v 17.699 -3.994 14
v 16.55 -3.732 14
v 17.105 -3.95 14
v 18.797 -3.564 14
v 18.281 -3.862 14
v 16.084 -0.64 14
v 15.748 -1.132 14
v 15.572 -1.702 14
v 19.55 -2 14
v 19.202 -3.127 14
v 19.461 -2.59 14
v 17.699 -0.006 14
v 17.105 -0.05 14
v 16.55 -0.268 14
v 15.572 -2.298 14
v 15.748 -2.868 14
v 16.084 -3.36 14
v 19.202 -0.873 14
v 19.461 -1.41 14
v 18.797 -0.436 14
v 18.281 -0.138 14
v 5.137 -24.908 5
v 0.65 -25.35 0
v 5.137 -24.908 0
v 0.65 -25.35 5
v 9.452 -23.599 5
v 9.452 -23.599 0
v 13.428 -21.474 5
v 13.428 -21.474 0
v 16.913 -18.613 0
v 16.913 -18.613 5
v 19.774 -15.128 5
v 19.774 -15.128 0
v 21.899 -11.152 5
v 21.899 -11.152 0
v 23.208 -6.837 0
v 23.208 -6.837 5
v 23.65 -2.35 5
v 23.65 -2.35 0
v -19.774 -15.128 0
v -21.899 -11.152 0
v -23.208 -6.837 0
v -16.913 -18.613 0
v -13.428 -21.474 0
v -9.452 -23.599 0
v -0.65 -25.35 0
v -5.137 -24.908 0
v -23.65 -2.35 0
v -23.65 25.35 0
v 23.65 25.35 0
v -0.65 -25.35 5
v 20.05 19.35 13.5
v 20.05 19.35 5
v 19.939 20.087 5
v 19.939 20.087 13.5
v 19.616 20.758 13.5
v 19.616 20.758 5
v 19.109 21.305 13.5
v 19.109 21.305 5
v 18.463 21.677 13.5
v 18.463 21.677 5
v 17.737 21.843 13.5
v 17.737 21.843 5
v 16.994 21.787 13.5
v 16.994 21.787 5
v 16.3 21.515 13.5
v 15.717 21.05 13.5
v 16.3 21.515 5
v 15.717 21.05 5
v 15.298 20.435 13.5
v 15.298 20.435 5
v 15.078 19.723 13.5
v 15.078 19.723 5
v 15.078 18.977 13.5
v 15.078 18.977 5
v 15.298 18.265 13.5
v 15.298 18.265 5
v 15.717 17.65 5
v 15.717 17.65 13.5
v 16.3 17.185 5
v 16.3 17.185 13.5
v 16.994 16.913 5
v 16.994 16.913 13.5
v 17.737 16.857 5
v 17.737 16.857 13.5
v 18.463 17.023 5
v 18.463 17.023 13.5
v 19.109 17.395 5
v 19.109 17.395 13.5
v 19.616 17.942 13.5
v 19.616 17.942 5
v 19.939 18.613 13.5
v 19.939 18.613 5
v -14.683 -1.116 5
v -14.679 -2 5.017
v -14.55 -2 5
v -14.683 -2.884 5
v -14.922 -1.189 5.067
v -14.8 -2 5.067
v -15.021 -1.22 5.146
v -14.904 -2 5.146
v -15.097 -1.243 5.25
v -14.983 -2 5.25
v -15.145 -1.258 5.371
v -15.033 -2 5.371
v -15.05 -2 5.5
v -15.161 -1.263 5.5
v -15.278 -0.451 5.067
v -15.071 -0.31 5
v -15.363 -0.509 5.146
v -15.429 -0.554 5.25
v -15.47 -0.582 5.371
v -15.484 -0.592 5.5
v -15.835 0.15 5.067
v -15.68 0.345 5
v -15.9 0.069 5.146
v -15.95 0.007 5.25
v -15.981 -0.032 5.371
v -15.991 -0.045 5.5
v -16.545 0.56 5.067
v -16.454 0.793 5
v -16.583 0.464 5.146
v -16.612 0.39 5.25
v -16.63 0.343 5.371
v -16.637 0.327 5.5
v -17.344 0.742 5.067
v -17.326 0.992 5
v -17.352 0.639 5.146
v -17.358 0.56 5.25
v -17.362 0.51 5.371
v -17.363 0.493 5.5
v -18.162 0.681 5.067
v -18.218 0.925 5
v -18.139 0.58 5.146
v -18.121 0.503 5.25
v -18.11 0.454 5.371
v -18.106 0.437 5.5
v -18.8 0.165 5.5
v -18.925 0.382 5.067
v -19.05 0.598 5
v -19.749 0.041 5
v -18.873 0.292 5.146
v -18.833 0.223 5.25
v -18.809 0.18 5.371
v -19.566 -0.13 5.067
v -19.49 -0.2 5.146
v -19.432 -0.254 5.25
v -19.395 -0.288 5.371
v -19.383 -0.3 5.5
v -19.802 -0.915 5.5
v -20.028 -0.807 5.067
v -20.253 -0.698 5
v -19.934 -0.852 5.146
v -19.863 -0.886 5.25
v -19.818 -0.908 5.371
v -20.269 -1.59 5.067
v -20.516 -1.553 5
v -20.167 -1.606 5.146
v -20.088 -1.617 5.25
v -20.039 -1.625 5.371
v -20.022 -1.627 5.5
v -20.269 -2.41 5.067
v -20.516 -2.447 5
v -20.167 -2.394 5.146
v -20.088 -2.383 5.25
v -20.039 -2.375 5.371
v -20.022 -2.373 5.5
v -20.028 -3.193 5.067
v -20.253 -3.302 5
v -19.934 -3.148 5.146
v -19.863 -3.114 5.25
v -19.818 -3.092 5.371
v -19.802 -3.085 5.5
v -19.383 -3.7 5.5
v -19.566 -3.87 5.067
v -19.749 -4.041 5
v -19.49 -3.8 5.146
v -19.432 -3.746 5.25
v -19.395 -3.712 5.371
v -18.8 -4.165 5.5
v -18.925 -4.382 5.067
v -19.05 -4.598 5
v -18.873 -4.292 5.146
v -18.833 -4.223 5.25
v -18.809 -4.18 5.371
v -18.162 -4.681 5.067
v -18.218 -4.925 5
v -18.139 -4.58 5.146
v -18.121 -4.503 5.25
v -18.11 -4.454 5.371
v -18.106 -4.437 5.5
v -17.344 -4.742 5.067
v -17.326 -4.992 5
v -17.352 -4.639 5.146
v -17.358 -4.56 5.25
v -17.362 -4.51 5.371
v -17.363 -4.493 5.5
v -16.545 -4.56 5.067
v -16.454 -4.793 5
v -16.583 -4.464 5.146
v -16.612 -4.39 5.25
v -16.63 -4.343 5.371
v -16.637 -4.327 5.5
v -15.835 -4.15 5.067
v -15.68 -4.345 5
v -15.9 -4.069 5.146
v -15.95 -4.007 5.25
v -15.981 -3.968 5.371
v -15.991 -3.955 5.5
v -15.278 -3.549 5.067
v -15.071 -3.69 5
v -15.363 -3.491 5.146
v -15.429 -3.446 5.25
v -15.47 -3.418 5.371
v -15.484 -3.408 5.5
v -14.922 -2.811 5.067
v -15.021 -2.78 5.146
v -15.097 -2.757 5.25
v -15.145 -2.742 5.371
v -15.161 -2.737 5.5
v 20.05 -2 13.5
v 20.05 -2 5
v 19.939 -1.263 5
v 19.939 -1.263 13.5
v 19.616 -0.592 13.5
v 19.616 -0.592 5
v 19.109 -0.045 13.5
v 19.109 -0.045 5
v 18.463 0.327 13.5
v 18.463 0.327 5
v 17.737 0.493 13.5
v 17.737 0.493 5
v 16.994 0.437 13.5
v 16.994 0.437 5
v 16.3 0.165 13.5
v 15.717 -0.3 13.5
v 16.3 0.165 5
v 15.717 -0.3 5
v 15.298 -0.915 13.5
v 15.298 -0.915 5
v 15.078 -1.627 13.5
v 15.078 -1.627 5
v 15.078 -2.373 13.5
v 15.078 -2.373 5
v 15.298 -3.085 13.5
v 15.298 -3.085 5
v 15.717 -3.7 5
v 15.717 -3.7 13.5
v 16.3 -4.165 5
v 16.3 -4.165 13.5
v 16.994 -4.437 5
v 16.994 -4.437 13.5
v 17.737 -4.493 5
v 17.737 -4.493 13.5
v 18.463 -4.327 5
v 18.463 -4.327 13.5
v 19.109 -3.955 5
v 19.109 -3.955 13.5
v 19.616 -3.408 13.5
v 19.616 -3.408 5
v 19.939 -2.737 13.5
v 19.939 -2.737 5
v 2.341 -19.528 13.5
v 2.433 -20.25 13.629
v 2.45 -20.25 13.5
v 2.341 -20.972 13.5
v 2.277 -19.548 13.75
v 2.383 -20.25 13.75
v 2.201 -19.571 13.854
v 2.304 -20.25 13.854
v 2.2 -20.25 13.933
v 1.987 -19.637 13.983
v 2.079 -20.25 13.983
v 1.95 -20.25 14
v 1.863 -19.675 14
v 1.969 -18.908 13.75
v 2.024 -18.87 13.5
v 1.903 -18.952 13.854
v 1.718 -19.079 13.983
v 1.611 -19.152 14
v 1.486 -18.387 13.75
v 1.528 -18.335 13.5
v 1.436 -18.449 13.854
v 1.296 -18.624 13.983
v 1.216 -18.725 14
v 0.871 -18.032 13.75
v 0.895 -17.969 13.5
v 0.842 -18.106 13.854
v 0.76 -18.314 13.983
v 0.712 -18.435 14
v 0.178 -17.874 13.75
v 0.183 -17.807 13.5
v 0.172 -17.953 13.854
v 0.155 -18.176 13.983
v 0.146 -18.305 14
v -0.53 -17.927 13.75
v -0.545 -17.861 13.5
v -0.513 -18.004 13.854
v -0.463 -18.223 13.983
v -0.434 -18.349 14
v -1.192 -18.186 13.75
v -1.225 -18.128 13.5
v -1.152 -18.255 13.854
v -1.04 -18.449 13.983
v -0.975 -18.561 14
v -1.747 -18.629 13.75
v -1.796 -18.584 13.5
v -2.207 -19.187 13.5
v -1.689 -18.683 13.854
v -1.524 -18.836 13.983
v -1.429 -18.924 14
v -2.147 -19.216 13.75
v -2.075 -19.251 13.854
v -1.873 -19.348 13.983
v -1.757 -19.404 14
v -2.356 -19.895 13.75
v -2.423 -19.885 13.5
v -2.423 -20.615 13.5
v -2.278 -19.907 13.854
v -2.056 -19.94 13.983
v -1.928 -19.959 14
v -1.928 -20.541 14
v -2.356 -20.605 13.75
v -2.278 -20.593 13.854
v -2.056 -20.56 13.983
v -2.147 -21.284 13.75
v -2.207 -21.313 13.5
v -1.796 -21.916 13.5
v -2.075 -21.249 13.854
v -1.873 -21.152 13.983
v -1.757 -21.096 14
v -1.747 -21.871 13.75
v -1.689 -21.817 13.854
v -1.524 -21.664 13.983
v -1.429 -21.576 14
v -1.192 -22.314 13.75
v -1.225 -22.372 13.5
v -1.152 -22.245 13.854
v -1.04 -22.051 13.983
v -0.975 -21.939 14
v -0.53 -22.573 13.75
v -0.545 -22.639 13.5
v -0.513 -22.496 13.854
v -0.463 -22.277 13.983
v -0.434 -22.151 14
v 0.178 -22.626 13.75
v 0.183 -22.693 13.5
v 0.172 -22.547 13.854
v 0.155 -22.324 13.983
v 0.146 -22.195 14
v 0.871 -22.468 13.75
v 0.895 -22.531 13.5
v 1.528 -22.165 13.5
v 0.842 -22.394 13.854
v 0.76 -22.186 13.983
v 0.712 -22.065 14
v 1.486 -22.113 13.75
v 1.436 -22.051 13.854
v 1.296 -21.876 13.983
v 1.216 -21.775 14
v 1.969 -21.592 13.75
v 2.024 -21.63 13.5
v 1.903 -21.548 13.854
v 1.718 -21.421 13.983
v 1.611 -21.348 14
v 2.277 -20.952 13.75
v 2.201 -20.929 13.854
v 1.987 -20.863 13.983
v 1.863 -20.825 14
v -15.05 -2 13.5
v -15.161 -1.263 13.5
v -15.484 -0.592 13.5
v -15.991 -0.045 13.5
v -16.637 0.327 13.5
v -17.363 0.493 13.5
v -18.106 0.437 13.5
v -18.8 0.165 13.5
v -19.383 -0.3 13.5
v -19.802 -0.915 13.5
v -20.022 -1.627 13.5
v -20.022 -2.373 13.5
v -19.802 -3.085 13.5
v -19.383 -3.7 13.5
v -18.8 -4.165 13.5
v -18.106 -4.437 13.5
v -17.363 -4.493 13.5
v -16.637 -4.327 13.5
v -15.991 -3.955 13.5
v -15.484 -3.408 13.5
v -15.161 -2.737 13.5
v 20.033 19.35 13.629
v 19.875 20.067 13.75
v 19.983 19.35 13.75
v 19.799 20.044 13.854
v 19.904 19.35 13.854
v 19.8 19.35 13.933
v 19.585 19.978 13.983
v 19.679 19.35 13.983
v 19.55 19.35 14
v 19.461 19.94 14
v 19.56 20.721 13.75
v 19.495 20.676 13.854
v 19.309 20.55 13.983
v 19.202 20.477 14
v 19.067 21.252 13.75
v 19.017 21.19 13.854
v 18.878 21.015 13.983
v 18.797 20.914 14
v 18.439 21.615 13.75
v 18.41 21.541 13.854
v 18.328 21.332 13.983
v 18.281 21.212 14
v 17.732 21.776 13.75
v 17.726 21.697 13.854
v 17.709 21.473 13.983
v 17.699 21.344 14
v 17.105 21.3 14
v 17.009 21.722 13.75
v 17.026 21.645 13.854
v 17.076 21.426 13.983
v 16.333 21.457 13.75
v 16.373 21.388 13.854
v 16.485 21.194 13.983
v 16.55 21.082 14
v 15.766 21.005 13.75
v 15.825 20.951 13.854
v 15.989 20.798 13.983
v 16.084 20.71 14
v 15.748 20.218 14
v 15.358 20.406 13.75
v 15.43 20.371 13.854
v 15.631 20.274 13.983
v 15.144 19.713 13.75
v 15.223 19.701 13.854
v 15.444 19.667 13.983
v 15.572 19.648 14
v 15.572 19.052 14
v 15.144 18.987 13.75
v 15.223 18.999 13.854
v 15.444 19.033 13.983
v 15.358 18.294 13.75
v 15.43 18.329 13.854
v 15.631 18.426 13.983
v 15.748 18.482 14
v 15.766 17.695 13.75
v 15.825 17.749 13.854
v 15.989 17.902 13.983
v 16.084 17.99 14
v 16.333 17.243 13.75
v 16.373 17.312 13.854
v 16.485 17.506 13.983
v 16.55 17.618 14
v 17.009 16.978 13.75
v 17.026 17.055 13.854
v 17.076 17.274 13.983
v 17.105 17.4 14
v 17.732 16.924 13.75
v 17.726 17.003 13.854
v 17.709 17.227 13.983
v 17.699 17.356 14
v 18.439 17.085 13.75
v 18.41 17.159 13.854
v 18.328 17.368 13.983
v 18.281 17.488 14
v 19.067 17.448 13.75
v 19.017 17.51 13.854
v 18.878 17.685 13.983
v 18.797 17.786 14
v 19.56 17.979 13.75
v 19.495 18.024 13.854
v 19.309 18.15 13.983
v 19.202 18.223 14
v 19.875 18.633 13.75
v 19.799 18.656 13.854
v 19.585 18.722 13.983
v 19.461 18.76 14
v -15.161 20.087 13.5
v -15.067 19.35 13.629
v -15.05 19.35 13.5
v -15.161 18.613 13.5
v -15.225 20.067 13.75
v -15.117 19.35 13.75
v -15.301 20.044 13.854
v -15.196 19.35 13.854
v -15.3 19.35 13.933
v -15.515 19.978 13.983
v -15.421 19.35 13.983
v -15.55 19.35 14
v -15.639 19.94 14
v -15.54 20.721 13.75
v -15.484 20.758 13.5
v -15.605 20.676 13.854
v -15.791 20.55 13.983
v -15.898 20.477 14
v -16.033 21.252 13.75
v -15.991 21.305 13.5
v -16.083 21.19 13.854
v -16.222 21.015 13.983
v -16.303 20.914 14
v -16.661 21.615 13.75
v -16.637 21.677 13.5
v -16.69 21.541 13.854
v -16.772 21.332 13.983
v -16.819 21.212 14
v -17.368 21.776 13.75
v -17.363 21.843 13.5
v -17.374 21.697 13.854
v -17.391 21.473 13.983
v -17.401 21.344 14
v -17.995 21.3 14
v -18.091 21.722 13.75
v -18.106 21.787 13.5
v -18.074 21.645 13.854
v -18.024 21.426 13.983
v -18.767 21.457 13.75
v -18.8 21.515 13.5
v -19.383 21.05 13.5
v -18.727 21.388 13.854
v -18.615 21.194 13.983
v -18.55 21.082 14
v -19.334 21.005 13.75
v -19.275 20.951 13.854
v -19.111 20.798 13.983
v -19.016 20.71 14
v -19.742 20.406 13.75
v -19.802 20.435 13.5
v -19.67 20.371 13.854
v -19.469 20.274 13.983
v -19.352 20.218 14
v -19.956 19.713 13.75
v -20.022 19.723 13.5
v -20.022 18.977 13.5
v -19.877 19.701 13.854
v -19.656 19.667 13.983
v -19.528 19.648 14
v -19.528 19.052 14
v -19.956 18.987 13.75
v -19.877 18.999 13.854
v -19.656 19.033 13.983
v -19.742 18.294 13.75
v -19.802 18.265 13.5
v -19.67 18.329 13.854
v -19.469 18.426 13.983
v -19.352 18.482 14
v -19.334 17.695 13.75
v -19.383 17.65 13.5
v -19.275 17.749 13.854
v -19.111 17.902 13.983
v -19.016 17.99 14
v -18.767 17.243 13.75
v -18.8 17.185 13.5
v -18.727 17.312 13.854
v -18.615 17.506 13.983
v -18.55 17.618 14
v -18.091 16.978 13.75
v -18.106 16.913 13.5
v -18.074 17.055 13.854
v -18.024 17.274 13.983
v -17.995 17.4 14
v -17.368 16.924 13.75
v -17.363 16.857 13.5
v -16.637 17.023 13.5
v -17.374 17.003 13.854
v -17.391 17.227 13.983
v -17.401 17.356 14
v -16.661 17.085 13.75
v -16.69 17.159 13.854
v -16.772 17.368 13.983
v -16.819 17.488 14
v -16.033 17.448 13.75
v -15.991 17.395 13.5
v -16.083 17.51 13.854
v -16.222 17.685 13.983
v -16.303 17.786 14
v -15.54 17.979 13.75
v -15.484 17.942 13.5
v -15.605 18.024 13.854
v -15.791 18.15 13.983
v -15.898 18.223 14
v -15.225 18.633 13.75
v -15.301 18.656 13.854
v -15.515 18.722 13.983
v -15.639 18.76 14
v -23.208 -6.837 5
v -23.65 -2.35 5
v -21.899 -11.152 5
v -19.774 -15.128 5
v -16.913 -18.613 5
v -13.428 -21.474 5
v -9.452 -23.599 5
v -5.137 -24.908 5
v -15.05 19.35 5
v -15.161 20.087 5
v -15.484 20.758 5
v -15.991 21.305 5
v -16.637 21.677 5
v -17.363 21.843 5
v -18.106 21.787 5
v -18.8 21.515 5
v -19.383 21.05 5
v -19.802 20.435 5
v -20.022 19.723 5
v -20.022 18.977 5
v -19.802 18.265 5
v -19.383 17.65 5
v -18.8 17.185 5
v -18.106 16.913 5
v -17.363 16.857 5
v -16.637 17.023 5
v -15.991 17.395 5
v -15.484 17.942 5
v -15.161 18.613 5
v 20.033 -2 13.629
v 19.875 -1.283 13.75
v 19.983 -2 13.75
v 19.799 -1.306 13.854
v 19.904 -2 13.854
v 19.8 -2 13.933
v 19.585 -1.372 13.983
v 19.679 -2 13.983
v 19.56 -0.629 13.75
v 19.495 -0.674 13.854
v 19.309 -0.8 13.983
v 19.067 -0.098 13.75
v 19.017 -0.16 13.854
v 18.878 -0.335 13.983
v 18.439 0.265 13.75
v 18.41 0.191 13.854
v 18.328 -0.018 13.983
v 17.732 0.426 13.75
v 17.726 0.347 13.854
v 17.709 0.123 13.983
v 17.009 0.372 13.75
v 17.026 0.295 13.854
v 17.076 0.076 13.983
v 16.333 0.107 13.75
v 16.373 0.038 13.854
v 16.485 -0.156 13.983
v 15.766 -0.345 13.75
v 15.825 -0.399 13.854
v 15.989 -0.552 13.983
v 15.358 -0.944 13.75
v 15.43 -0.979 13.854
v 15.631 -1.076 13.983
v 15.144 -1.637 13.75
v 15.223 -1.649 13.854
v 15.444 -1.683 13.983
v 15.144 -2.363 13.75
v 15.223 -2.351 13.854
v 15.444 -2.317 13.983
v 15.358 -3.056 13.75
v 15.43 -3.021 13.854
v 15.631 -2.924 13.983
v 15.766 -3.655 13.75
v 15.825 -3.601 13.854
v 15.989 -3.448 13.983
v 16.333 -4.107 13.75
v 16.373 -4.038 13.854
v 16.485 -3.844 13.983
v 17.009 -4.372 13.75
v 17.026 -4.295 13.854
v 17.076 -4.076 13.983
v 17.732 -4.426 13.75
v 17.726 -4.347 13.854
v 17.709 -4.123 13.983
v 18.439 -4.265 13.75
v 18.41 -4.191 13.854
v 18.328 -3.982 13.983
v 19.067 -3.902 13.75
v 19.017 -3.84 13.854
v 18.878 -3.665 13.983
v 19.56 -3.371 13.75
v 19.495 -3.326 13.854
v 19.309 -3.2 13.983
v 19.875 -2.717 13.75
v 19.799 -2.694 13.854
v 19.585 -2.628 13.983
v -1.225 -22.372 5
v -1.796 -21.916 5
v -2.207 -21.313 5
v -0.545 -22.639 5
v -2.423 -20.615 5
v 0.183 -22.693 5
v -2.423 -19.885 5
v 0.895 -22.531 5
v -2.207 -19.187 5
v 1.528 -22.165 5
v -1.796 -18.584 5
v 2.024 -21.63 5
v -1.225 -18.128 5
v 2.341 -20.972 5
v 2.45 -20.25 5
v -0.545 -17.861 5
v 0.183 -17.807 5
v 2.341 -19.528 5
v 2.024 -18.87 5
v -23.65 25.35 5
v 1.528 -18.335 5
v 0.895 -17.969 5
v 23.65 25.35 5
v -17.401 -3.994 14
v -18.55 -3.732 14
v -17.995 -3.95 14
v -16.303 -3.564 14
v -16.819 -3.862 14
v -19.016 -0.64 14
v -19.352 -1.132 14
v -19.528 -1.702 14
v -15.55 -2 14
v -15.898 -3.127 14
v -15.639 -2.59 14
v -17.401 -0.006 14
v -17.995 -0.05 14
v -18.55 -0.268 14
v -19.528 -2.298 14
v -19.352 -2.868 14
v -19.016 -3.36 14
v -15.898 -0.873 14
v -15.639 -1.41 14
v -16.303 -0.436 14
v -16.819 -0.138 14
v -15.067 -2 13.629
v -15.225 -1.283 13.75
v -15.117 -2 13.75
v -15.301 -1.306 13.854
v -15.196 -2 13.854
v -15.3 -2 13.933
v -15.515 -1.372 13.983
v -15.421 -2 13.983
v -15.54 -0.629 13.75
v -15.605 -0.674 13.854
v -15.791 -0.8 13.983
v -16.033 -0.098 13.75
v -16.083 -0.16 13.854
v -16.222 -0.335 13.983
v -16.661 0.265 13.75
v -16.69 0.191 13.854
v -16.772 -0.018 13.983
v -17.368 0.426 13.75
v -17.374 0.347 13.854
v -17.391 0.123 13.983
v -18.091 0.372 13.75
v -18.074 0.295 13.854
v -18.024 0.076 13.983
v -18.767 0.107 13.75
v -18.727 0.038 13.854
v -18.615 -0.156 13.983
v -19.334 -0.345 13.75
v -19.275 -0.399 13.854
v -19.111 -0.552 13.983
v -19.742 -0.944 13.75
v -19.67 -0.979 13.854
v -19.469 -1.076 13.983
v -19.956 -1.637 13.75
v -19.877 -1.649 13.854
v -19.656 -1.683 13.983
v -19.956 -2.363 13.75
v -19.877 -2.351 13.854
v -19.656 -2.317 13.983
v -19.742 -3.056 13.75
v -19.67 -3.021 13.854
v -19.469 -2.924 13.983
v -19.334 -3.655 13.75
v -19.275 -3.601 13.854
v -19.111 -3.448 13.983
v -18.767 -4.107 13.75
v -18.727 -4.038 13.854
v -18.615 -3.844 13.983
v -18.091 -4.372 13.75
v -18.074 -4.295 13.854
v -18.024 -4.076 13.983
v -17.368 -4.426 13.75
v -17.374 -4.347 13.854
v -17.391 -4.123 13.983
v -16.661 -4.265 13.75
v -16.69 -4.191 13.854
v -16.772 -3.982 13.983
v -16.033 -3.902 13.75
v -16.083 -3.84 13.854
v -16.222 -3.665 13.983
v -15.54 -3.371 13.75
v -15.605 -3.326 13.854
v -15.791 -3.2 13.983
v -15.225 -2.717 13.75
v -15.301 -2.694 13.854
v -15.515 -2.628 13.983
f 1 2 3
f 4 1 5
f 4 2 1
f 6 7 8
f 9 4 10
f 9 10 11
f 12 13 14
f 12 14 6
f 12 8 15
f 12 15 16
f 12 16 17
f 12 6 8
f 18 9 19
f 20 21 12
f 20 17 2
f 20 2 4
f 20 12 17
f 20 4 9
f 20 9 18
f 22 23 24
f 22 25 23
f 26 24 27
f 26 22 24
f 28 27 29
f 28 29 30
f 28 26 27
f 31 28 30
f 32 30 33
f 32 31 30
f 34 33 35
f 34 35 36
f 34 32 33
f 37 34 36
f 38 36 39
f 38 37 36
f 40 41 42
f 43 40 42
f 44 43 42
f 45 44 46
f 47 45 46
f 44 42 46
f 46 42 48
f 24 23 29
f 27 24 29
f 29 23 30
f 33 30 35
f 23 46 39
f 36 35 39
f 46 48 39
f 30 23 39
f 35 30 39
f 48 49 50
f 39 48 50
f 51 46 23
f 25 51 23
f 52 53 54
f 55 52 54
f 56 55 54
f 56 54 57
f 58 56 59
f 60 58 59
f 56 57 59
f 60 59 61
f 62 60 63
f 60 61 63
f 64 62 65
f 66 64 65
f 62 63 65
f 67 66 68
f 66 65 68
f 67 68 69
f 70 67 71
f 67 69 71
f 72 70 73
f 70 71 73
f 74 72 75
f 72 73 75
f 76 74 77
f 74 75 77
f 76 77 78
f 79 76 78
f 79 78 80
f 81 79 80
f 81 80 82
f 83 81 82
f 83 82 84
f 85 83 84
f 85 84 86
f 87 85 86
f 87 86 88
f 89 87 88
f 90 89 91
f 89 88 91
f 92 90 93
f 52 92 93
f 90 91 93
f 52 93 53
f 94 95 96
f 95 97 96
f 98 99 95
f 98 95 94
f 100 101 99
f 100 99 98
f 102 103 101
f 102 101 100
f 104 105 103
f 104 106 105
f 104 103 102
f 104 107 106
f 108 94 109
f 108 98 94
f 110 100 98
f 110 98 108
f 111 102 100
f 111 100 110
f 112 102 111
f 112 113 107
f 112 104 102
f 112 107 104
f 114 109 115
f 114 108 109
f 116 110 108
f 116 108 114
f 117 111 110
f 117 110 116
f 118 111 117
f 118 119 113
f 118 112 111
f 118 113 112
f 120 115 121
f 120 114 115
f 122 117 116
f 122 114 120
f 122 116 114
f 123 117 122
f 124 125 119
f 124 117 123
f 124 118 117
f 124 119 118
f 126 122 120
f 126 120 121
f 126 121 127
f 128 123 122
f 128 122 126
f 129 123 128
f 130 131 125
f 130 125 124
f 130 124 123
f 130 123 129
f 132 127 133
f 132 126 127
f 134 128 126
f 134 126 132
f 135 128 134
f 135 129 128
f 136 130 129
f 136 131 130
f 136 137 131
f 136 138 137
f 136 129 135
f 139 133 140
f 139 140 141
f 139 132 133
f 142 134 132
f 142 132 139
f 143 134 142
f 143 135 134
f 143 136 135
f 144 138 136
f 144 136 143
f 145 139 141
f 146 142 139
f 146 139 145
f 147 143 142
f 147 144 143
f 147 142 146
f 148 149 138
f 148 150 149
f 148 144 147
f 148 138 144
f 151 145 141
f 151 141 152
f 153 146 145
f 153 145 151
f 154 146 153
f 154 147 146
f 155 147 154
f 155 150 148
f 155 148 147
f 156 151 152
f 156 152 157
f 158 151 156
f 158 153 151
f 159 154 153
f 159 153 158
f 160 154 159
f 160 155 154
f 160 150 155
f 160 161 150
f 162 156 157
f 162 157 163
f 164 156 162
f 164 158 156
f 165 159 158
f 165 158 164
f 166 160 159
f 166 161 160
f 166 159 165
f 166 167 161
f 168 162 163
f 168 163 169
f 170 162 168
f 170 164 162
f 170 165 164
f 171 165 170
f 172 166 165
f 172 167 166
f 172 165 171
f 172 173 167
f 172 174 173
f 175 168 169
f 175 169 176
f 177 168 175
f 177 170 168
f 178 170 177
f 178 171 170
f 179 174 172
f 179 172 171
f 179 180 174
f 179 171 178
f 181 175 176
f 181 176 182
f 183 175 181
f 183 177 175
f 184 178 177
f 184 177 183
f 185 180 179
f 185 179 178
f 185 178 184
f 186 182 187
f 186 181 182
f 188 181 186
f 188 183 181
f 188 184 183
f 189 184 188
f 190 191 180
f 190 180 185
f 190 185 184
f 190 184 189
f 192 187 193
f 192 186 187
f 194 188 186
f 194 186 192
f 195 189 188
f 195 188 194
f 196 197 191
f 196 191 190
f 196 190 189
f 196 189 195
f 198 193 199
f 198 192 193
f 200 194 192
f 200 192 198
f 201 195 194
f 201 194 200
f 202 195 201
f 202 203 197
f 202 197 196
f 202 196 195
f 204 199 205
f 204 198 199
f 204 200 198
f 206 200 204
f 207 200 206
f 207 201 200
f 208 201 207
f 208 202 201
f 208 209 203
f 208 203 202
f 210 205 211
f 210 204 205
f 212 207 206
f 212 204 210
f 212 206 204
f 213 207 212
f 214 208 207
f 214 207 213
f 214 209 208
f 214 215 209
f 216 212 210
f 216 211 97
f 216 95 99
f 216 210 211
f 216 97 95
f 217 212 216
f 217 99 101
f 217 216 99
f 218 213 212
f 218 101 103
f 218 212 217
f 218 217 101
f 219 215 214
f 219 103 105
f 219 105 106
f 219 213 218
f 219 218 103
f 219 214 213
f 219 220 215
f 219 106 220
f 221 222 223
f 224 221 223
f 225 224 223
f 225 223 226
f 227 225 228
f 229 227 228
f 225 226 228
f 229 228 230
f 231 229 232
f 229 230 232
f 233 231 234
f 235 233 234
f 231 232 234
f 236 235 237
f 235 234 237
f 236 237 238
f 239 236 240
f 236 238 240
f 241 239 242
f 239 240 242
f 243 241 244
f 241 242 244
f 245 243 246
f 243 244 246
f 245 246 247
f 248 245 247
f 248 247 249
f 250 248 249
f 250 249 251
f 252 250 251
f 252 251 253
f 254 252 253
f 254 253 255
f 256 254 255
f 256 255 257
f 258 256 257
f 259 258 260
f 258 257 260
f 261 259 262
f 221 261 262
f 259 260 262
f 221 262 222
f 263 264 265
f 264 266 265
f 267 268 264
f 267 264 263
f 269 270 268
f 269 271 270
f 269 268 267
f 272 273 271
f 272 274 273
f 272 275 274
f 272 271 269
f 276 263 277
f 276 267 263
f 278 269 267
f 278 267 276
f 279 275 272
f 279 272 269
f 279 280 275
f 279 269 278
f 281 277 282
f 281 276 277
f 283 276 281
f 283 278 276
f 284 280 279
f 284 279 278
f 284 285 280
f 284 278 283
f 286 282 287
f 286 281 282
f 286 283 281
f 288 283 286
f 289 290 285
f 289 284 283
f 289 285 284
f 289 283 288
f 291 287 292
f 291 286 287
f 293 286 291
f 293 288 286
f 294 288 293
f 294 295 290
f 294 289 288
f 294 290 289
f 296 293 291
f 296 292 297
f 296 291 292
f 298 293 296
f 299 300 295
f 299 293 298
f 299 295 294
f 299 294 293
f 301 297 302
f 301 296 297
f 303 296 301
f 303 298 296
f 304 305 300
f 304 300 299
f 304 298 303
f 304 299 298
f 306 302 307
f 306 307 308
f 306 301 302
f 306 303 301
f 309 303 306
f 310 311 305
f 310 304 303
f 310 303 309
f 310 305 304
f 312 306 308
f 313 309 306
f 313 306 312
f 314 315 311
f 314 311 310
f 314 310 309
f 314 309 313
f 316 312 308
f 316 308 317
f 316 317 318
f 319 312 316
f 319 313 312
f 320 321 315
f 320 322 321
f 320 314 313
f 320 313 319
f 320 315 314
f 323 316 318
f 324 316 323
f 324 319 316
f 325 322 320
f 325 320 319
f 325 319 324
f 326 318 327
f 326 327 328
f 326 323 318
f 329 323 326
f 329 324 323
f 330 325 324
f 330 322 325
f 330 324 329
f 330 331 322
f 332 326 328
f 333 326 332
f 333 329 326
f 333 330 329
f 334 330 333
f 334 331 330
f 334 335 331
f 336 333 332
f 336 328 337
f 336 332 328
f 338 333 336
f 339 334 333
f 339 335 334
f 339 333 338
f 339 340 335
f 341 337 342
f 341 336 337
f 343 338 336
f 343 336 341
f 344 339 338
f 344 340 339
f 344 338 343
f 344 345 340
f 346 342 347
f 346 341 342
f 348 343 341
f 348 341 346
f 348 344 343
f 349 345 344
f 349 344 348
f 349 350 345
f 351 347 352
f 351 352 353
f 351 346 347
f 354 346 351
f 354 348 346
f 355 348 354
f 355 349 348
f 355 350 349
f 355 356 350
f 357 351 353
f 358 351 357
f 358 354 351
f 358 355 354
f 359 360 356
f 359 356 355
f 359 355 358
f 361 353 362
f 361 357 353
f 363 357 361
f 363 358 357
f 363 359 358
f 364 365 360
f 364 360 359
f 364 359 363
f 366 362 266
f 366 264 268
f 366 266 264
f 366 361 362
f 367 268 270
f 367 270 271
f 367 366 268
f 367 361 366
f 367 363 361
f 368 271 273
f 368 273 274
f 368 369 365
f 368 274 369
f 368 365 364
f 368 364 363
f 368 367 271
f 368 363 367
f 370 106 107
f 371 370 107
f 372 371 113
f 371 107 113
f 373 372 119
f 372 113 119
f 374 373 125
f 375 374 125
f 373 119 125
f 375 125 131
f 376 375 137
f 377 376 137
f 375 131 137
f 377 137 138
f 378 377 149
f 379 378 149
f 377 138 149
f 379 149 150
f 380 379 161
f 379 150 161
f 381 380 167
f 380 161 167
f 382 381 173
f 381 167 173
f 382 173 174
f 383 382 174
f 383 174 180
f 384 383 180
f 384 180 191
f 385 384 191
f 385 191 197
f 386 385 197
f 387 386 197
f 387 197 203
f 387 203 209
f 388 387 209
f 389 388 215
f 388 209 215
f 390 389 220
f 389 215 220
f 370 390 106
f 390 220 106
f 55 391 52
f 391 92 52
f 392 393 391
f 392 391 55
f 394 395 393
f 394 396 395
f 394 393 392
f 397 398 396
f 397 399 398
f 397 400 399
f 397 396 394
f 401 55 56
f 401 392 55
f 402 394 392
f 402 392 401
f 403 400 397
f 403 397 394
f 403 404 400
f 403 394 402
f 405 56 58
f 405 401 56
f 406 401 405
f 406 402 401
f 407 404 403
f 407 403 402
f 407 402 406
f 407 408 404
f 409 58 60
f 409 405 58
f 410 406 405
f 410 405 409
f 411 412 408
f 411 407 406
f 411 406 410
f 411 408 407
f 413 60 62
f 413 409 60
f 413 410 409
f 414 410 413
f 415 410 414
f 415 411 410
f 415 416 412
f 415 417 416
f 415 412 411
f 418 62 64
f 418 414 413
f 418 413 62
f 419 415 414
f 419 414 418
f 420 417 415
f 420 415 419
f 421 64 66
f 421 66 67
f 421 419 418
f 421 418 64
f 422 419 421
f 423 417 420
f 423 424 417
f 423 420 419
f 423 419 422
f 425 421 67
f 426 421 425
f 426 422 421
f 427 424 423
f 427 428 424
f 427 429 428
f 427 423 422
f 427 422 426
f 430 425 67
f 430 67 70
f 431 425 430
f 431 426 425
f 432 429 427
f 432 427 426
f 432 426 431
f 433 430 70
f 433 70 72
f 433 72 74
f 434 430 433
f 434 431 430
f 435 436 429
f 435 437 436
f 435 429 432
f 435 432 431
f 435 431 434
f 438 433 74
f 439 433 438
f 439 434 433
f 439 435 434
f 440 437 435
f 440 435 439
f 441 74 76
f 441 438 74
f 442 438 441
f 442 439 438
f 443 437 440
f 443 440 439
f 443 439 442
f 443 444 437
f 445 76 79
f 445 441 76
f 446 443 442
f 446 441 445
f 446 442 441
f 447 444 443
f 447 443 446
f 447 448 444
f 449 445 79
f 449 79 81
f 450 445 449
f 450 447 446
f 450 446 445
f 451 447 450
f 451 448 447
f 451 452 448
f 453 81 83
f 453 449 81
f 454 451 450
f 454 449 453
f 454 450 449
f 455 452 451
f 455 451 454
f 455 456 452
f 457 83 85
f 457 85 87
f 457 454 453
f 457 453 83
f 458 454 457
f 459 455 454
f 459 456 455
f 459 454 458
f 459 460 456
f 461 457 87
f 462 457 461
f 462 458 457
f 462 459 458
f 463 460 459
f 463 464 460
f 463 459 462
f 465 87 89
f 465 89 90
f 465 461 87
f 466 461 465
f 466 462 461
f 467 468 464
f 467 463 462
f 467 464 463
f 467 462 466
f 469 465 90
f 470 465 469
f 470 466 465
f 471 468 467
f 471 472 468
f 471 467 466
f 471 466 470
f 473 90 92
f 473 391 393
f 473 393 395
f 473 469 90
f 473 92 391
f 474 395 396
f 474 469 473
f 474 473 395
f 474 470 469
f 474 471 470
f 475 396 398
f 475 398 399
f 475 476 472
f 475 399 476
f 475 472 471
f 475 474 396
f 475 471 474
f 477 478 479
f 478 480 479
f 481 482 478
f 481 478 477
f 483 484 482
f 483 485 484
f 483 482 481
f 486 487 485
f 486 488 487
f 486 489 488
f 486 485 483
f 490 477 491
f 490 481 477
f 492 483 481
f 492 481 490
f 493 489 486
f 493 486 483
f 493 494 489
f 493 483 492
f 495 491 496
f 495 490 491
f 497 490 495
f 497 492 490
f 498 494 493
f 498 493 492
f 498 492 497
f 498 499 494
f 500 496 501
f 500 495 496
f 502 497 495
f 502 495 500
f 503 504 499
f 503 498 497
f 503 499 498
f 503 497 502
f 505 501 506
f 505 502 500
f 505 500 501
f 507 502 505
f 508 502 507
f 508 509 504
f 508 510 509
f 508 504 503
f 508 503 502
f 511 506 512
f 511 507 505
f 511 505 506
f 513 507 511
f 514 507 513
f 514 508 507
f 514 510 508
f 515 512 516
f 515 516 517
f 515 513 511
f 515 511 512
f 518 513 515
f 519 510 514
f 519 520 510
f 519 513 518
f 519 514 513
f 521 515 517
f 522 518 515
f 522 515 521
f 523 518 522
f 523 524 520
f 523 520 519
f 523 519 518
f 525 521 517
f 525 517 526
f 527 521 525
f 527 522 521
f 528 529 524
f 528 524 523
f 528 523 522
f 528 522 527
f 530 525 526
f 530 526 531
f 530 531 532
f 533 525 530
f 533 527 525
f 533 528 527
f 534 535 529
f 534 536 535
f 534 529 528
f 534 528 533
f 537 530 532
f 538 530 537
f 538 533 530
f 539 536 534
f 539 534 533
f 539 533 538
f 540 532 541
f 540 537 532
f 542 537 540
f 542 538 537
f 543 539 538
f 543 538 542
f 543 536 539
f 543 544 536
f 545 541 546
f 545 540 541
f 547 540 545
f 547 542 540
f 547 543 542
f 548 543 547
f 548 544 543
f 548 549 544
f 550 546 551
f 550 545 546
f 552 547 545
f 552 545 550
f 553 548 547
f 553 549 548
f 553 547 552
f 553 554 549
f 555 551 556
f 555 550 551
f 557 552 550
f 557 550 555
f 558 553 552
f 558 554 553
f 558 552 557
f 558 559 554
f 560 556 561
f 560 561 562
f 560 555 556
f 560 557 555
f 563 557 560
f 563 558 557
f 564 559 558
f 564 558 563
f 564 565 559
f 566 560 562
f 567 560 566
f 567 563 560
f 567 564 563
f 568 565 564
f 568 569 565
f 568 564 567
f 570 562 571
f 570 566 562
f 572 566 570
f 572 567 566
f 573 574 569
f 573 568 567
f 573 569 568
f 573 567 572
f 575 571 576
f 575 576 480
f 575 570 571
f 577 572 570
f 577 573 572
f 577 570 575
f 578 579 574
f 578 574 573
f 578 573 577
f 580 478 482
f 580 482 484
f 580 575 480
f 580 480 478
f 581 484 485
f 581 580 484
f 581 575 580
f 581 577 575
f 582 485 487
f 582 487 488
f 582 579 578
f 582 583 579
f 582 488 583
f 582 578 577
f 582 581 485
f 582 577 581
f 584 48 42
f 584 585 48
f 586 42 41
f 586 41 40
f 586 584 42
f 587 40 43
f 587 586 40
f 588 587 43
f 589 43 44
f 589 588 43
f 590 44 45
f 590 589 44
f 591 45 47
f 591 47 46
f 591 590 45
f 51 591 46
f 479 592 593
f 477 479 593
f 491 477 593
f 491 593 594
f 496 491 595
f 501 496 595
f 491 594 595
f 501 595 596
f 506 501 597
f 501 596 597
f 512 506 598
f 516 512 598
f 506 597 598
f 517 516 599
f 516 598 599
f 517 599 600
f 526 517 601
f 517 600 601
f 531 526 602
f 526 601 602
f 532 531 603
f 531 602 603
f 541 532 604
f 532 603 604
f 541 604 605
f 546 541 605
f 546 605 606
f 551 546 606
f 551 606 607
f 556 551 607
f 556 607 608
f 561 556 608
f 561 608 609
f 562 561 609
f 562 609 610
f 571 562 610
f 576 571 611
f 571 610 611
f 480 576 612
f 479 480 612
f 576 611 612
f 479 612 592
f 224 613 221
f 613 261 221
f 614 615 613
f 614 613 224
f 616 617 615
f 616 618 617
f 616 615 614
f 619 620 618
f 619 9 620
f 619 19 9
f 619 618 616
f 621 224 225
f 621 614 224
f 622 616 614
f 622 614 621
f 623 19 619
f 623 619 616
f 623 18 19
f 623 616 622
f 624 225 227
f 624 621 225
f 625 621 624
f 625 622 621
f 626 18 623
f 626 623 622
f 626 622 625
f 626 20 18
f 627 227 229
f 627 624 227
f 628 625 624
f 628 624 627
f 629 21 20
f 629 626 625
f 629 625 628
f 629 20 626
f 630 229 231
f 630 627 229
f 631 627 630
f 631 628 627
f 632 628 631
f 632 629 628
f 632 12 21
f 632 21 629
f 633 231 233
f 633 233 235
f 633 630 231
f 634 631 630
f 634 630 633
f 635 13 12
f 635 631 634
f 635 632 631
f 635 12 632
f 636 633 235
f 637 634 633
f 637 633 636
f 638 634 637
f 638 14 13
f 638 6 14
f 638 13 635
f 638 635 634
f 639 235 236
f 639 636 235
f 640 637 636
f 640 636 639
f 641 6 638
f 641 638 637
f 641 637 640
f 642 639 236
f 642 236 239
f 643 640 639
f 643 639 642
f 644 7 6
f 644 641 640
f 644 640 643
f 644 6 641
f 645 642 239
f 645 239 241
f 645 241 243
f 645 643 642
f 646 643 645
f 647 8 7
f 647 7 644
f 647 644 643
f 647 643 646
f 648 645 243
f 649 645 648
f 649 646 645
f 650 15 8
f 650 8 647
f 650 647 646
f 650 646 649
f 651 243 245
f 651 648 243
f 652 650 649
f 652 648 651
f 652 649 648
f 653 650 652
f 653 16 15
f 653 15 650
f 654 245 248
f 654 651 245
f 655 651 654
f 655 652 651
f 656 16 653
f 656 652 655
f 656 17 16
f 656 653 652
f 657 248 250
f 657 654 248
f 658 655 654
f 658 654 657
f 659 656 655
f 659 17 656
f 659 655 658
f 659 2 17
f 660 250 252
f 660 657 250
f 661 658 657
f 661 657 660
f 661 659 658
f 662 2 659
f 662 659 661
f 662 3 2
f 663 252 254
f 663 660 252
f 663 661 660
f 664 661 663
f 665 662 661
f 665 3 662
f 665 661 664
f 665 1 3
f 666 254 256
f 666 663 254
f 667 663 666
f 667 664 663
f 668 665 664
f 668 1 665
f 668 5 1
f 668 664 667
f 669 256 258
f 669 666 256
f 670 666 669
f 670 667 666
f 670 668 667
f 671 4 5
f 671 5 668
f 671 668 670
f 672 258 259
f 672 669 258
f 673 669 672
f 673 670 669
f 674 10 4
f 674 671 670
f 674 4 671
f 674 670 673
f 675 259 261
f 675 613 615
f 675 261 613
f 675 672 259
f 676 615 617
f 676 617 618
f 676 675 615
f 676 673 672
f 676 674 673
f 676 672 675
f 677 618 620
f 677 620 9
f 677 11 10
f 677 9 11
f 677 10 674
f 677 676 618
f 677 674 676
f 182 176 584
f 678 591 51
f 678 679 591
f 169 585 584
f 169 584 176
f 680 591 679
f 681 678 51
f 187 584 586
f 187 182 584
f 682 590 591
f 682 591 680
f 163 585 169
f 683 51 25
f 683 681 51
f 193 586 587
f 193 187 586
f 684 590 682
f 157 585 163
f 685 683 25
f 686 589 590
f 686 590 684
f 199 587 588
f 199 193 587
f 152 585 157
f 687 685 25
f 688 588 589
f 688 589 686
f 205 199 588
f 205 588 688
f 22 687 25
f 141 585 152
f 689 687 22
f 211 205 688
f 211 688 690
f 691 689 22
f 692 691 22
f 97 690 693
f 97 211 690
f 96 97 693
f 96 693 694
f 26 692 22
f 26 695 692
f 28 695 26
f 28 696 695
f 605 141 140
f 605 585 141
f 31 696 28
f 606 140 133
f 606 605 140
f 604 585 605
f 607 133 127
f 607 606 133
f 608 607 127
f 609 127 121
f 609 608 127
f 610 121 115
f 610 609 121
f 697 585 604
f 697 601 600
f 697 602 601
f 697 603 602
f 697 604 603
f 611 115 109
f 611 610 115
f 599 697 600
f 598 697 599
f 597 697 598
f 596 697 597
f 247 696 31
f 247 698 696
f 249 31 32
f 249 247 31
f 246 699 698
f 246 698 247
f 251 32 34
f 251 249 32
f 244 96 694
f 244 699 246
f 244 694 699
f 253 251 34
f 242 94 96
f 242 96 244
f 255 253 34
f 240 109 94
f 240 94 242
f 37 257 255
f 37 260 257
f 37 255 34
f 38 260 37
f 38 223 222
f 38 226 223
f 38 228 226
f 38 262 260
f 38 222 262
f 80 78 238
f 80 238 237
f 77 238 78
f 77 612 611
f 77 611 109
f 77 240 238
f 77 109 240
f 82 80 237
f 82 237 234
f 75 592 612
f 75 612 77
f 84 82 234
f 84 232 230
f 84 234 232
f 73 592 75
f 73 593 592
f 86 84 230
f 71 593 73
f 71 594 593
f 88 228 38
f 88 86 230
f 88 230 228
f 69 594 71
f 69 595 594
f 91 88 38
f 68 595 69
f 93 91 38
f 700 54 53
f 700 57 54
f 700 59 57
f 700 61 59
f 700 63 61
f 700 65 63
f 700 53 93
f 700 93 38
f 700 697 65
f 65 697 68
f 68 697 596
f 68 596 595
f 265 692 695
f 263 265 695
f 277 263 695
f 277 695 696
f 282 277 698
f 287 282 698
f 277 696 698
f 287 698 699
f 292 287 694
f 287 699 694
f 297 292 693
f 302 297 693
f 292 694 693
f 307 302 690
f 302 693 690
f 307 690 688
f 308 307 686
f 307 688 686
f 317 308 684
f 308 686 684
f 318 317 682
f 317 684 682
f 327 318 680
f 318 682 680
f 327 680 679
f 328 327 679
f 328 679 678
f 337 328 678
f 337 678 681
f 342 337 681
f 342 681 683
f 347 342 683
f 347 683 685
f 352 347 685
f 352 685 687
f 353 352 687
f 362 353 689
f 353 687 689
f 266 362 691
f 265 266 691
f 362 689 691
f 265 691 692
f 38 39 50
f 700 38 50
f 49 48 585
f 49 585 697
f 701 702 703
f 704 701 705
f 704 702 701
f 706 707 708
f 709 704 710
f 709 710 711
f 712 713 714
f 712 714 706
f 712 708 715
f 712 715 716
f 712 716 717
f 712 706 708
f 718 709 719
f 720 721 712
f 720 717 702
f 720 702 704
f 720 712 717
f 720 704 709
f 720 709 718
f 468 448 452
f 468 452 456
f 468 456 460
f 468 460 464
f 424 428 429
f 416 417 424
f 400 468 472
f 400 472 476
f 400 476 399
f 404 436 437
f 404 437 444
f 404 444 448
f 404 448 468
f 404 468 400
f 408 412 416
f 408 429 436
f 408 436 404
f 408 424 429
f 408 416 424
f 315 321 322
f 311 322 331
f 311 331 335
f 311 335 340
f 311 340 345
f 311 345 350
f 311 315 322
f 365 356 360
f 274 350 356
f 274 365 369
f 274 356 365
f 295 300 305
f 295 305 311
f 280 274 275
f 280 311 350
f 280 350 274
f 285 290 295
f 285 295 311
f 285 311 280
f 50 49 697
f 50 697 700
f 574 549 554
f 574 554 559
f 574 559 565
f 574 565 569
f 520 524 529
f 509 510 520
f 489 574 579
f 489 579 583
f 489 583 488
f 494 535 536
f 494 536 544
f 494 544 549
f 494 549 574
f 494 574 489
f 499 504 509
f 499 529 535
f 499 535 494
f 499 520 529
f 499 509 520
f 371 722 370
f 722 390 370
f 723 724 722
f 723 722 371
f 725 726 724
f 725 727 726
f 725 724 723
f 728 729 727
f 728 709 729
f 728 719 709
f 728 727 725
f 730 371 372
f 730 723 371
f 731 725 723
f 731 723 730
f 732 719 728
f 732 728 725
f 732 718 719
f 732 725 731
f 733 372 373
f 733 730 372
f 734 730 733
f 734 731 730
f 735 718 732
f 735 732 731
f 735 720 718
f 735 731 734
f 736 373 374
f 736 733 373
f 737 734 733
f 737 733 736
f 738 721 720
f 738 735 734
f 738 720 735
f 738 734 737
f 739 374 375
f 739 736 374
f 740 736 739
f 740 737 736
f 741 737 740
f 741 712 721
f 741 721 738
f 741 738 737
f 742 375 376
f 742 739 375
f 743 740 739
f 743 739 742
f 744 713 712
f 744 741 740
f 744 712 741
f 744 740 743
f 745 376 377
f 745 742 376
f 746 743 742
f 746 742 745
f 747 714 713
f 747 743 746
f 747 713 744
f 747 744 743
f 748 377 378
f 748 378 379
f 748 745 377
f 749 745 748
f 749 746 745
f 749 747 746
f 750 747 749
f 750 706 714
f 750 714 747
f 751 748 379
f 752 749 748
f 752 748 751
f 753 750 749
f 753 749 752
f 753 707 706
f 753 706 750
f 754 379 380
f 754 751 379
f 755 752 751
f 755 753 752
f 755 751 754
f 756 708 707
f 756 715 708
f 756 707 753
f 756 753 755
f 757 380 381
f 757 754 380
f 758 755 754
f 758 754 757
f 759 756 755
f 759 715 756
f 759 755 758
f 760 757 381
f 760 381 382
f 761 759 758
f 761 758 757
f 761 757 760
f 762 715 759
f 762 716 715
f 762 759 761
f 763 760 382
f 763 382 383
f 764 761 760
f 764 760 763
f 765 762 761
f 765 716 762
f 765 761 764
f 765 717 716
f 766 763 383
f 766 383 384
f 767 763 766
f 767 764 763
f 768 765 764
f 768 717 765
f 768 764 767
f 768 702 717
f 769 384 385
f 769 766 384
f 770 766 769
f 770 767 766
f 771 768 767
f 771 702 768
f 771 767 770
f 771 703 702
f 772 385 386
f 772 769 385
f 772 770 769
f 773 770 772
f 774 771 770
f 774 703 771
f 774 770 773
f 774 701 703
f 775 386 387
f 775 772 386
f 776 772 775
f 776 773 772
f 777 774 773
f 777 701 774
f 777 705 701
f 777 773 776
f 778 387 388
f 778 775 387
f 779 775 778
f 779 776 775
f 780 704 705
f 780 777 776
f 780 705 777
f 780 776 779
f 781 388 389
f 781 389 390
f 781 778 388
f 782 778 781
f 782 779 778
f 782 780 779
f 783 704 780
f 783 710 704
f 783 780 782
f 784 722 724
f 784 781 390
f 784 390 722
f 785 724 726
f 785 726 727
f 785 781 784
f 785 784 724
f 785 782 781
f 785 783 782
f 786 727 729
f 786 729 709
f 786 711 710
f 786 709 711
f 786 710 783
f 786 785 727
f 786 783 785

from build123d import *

# Parameters (mm, degrees)
F0_W     = 47.3
F0_H     = 50.7
F1_DEPTH = 5
F2_R     = 23
F3_R     = 2.5
F3_R_2   = 2.45
F4_DEPTH = 9
F5_R     = 0.5


with BuildPart() as f1:
    # F0 (on Top) → F1 (new body)
    with BuildSketch(Plane.XY):
        Rectangle(F0_W, F0_H)
    extrude(amount=F1_DEPTH)

    # F2
    f2_edges = [f1.edges().sort_by_distance(p)[0] for p in [
        (-23.65, -25.35, 2.5),
        (23.65, -25.35, 2.5),
    ]]
    fillet(f2_edges, radius=F2_R)

    # F3 (on face) → F4 (join)
    with BuildSketch(Plane.XY.offset(5)):
        with Locations((-17.55, 19.35)):
            Circle(F3_R)
        with Locations((17.55, 19.35)):
            Circle(F3_R)
        with Locations((17.55, -2)):
            Circle(F3_R)
        with Locations((-17.55, -2)):
            Circle(F3_R)
        with Locations((0, -20.25)):
            Circle(F3_R_2)
    extrude(amount=F4_DEPTH)

    # F5
    f5_edges = [f1.edges().sort_by_distance(p)[0] for p in [
        (-20.05, 19.35, 14),
        (15.05, 19.35, 14),
        (15.05, -2, 14),
        (-2.45, -20.25, 14),
        (-15.05, -2, 9.5),
        (-20.05, -2, 5),
        (-20.05, -2, 14),
    ]]
    fillet(f5_edges, radius=F5_R)


solid = f1.part
